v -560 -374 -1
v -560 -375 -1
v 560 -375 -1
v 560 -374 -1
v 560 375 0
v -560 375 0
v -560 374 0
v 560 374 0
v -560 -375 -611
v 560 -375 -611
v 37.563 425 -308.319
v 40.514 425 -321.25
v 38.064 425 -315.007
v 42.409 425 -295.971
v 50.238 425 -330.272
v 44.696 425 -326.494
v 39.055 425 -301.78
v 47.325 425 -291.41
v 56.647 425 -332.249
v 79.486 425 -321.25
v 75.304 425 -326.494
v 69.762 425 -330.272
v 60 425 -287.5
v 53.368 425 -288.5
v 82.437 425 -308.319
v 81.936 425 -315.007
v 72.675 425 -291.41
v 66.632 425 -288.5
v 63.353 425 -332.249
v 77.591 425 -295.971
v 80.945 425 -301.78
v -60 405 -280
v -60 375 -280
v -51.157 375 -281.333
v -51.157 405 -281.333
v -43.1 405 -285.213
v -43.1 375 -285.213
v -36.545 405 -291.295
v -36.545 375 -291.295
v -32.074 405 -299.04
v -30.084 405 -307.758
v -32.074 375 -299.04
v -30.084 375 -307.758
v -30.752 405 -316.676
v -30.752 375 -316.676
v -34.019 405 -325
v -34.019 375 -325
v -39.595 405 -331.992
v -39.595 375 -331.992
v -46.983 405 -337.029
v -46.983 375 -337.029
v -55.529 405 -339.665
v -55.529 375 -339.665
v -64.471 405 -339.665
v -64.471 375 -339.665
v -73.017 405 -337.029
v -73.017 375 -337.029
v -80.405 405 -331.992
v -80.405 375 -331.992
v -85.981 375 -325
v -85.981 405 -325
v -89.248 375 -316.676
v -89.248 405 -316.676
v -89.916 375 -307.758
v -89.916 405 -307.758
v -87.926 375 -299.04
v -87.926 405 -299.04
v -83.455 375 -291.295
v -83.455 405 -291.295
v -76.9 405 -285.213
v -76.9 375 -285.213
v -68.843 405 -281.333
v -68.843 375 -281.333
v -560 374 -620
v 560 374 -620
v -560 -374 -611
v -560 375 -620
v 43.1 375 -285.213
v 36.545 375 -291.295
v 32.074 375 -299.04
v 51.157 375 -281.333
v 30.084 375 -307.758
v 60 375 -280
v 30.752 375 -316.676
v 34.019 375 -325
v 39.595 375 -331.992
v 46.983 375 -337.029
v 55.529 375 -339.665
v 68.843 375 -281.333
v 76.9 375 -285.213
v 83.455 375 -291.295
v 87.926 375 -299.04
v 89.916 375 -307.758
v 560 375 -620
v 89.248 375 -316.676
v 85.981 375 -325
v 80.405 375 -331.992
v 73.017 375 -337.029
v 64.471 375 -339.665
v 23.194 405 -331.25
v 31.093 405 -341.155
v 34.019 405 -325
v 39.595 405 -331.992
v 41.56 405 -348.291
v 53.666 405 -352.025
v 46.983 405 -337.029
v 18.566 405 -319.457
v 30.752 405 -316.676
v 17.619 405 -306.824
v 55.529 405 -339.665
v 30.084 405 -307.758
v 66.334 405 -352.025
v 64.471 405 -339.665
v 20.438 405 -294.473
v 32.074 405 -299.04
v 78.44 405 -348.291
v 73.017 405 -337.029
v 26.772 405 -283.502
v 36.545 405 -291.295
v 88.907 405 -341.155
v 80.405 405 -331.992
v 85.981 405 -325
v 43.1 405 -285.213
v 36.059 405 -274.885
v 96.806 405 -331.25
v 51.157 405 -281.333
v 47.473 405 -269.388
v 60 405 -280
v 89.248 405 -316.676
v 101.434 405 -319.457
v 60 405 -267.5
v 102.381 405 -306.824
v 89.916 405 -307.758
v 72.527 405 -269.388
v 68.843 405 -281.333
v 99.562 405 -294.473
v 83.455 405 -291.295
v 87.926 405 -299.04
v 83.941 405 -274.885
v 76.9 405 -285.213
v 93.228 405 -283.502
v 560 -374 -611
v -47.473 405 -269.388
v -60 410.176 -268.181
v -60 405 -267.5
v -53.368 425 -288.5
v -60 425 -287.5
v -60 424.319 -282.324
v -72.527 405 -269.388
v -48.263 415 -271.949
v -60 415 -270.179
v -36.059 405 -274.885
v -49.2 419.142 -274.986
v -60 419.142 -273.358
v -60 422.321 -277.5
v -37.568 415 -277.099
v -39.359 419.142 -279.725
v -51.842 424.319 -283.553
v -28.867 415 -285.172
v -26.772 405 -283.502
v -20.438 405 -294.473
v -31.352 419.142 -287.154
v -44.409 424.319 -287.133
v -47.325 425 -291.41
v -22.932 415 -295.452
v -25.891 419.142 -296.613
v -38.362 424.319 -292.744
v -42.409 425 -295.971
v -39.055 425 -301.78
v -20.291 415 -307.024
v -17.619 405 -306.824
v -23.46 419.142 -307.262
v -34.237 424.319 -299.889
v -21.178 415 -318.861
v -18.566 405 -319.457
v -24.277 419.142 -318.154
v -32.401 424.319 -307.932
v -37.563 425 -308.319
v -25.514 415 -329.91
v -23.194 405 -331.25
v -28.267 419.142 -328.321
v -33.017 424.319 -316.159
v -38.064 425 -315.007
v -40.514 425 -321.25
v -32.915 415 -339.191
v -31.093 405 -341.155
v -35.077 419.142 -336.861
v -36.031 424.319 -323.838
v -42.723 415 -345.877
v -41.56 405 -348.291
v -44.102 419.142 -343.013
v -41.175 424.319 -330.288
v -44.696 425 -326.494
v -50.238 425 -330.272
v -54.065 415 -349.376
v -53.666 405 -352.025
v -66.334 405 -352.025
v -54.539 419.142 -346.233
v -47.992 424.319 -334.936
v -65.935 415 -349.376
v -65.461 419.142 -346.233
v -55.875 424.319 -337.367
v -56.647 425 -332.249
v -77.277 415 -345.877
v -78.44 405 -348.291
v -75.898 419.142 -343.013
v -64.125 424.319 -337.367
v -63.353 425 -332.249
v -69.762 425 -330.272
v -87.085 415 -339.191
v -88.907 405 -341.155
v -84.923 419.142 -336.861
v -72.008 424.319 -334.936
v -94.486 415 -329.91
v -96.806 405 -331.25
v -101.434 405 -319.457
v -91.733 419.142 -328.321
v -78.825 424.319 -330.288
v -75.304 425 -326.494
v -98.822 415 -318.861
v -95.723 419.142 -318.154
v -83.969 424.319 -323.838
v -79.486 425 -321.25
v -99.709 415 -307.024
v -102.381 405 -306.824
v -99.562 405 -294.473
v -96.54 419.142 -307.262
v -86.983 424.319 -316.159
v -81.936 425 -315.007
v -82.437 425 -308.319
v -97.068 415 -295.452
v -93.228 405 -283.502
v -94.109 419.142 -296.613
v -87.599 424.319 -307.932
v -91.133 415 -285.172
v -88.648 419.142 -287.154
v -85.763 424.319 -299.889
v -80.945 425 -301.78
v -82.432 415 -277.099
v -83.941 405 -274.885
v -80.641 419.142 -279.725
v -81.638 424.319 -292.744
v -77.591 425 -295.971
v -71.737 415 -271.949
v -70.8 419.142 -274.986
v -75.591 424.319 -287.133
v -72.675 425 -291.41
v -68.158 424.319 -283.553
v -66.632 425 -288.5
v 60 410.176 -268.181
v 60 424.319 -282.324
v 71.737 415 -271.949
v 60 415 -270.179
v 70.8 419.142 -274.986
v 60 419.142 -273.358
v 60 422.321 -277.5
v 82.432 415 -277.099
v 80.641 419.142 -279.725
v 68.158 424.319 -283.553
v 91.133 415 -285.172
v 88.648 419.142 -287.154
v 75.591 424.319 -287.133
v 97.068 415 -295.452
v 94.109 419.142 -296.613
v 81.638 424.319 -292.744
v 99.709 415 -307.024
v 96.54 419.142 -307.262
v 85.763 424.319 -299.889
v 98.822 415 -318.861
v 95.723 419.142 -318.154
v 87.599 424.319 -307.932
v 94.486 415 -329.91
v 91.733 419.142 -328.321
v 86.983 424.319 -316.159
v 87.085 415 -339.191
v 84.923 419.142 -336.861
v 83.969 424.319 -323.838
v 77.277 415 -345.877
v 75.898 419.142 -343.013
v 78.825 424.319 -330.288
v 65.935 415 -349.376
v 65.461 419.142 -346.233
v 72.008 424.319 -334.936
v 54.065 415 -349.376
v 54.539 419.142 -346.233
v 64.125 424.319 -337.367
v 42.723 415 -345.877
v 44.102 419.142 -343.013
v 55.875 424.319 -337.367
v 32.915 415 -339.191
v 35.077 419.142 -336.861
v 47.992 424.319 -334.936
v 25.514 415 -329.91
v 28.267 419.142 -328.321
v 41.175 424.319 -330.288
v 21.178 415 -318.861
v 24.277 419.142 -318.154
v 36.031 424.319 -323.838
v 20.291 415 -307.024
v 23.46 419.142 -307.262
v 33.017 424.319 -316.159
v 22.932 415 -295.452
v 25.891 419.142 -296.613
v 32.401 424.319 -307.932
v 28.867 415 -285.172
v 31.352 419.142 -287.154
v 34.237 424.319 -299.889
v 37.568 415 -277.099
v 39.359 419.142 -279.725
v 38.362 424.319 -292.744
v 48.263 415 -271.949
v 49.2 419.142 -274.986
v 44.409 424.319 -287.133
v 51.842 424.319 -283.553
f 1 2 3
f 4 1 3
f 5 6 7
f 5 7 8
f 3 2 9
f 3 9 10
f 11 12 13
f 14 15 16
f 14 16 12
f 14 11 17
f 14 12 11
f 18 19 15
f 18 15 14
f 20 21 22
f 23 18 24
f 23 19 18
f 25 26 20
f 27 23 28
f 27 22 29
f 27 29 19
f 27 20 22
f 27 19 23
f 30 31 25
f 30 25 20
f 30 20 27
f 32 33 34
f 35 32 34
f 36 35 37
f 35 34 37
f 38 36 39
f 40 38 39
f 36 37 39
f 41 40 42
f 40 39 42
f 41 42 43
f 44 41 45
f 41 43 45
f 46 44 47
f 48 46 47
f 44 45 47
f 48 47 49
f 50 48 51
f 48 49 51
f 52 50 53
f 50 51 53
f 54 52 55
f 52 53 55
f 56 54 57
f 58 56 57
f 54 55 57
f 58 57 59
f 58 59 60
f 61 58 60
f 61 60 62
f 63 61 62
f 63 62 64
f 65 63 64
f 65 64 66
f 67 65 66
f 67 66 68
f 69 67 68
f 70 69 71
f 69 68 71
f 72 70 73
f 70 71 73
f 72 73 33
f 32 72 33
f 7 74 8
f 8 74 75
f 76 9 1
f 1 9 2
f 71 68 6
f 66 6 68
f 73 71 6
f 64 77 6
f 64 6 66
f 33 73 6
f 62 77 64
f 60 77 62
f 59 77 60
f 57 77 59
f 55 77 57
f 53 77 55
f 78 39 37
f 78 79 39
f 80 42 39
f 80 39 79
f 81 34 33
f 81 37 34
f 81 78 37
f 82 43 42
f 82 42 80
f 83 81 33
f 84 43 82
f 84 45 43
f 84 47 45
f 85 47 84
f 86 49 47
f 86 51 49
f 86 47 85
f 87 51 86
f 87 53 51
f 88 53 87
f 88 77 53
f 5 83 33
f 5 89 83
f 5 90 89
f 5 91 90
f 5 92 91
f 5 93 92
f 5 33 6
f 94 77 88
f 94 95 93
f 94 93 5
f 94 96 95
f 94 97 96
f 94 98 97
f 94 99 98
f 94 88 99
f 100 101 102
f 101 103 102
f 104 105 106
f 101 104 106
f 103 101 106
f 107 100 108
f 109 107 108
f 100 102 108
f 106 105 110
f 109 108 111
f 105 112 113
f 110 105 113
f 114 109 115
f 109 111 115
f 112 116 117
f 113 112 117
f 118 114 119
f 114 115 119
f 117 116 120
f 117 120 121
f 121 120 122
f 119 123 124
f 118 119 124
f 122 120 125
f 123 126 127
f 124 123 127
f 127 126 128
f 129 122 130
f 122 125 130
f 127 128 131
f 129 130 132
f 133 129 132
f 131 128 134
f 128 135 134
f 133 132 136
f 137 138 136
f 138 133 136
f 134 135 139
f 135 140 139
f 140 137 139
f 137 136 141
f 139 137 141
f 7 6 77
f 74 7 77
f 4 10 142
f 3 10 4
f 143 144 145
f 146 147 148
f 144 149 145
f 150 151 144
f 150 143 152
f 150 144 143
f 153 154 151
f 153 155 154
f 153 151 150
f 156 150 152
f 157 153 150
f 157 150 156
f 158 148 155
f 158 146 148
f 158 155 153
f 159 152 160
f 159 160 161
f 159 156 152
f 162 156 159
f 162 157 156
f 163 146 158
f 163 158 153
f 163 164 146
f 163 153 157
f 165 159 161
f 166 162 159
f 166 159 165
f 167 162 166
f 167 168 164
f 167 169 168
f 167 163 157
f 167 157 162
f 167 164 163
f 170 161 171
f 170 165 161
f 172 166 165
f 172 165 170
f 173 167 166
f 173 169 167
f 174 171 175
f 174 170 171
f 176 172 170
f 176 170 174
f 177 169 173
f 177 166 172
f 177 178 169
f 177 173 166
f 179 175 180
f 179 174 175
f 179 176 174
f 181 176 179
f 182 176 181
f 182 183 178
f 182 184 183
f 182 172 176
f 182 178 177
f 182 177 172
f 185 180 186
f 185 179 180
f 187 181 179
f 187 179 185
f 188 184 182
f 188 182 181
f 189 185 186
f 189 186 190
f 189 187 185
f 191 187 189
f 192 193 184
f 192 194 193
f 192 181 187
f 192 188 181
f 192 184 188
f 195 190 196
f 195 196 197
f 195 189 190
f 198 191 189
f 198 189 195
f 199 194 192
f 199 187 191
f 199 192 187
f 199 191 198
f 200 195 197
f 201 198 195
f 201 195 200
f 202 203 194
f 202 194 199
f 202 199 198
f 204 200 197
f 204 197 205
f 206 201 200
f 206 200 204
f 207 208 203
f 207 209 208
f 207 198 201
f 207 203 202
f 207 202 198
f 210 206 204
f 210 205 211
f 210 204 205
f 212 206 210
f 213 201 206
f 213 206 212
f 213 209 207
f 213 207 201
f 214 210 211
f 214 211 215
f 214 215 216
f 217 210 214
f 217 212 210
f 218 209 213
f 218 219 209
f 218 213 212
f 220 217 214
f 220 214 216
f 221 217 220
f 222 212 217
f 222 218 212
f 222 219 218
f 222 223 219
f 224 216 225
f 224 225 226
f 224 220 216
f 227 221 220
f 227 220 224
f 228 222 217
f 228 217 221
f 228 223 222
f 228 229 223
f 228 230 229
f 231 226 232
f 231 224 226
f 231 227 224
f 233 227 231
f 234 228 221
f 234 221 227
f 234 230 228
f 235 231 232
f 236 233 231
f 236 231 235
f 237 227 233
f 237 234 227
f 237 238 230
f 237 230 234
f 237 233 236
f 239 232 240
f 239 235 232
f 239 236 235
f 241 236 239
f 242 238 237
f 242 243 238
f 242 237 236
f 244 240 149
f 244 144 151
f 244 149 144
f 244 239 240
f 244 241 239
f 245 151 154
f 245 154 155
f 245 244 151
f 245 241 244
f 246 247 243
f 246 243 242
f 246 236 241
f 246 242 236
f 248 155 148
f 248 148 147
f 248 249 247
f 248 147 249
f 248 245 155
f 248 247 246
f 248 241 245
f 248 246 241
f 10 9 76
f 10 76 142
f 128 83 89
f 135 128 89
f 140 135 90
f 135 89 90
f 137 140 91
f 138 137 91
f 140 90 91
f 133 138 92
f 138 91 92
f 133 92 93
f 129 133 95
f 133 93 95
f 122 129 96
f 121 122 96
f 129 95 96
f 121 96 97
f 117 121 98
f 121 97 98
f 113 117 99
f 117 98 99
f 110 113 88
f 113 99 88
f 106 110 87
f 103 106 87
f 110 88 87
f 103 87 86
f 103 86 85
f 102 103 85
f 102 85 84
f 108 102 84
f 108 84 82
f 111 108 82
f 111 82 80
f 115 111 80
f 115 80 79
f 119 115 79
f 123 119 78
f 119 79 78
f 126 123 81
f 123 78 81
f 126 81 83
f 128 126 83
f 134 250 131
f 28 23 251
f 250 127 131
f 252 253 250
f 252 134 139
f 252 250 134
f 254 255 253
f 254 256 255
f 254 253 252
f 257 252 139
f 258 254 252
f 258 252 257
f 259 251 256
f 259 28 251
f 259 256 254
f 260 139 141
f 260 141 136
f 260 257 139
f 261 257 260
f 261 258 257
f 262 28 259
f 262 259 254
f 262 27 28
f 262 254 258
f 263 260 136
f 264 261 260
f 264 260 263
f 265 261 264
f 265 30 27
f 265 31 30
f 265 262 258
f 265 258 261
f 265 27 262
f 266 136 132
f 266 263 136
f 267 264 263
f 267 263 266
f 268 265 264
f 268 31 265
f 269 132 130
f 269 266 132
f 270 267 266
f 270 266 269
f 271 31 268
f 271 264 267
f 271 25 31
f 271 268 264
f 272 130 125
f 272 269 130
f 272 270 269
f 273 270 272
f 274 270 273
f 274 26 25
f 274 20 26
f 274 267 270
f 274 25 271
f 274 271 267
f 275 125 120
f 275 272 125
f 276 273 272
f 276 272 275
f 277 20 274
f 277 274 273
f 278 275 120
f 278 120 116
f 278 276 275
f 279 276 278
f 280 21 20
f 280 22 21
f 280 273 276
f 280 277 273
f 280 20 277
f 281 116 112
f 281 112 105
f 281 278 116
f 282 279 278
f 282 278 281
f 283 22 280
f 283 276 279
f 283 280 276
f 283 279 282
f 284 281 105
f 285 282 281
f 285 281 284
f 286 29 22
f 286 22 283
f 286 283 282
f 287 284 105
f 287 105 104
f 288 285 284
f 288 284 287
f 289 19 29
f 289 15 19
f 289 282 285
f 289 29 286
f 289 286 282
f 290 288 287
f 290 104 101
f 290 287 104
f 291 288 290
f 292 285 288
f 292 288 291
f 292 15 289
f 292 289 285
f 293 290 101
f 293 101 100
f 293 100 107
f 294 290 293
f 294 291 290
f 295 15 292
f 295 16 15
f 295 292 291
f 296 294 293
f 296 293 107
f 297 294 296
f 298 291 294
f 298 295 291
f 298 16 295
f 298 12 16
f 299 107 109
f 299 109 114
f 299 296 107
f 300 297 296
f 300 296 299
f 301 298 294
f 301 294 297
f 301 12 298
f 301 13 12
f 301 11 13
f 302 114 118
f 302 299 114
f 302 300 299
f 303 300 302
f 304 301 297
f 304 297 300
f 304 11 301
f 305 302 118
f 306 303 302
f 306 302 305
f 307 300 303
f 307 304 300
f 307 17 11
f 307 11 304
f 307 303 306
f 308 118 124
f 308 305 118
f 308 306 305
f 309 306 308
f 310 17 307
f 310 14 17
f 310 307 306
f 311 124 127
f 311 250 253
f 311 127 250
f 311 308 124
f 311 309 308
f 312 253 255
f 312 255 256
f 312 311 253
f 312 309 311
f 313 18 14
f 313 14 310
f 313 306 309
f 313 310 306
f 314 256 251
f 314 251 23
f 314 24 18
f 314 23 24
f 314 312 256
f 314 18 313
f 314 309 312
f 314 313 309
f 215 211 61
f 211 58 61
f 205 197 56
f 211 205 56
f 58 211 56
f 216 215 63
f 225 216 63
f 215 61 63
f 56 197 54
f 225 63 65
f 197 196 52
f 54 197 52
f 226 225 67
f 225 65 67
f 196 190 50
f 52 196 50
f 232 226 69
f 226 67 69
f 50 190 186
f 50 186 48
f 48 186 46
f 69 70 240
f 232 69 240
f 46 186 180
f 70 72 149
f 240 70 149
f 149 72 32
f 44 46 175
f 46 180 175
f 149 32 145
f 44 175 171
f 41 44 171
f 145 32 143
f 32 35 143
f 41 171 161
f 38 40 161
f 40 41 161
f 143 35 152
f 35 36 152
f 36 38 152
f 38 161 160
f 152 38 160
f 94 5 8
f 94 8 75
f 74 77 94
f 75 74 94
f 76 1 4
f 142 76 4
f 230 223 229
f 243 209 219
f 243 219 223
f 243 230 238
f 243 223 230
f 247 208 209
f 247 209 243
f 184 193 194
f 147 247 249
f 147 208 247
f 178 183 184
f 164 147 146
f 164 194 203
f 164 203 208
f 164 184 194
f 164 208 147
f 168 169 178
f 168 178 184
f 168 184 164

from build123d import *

# Parameters (mm, degrees)
SKETCH2_W           = 1120
SKETCH2_H           = 610
BASE_FLANGE1_DEPTH  = 1
SKETCH8_W           = 560
SKETCH8_H           = 620
BASE_FLANGE2_DEPTH  = 1
SKETCH11_W          = 560
SKETCH11_H          = 620
BASE_FLANGE3_DEPTH  = 1
SKETCH14_R          = 30
BOSS_EXTRUDE1_DEPTH = 30
SKETCH17_R          = 42.5
BOSS_EXTRUDE2_DEPTH = 20
FILLET1_R           = 20


# Sheet-metal steps are written as plain solids
with BuildPart() as part:
    # Sketch2 → Base-Flange1 (new body)
    with BuildSketch(Plane.XZ.offset(375)):
        with Locations((0, -306)):
            Rectangle(SKETCH2_W, SKETCH2_H)
    extrude(amount=-BASE_FLANGE1_DEPTH)


with BuildPart() as body_2:
    # Sketch8 → Base-Flange2 (new body)
    with BuildSketch(Plane(origin=(0, 375, 0), x_dir=(1, 0, 0), z_dir=(0, 1, 0))):
        with Locations((-280, 310)):
            Rectangle(SKETCH8_W, SKETCH8_H)
    extrude(amount=-BASE_FLANGE2_DEPTH)



with BuildPart() as body_3:
    # Sketch11 → Base-Flange3 (new body)
    with BuildSketch(Plane(origin=(0, 375, 0), x_dir=(1, 0, 0), z_dir=(0, 1, 0))):
        with Locations((280, 310)):
            Rectangle(SKETCH11_W, SKETCH11_H)
    extrude(amount=-BASE_FLANGE3_DEPTH)


with BuildPart() as body_2_1:
    add(body_2.part)

    add(body_3.part)  # Boss-Extrude1 merges body 3
    # Sketch14 → Boss-Extrude1 (add)
    with BuildSketch(Plane(origin=(0, 375, 0), x_dir=(1, 0, 0), z_dir=(0, 1, 0))):
        with Locations(Location((-60, 310, 0), (0, 0, 270))):
            Circle(SKETCH14_R)
        with Locations(Location((60, 310, 0), (0, 0, 270))):
            Circle(SKETCH14_R)
    extrude(amount=BOSS_EXTRUDE1_DEPTH)

    # Sketch17 → Boss-Extrude2 (add)
    with BuildSketch(Plane(origin=(0, 405, 0), x_dir=(1, 0, 0), z_dir=(0, 1, 0))):
        with Locations(Location((-60, 310, 0), (0, 0, 270))):
            Circle(SKETCH17_R)
        with Locations(Location((60, 310, 0), (0, 0, 270))):
            Circle(SKETCH17_R)
    extrude(amount=BOSS_EXTRUDE2_DEPTH)

    # Fillet1
    fillet1_edges = [body_2_1.edges().sort_by_distance(p)[0] for p in [
        (-60, 425, -352.5),
        (60, 425, -352.5),
    ]]
    fillet(fillet1_edges, radius=FILLET1_R - 0.0001)  # a hair under: the kernel refuses the full size


solid = Compound([part.part, body_2_1.part])
